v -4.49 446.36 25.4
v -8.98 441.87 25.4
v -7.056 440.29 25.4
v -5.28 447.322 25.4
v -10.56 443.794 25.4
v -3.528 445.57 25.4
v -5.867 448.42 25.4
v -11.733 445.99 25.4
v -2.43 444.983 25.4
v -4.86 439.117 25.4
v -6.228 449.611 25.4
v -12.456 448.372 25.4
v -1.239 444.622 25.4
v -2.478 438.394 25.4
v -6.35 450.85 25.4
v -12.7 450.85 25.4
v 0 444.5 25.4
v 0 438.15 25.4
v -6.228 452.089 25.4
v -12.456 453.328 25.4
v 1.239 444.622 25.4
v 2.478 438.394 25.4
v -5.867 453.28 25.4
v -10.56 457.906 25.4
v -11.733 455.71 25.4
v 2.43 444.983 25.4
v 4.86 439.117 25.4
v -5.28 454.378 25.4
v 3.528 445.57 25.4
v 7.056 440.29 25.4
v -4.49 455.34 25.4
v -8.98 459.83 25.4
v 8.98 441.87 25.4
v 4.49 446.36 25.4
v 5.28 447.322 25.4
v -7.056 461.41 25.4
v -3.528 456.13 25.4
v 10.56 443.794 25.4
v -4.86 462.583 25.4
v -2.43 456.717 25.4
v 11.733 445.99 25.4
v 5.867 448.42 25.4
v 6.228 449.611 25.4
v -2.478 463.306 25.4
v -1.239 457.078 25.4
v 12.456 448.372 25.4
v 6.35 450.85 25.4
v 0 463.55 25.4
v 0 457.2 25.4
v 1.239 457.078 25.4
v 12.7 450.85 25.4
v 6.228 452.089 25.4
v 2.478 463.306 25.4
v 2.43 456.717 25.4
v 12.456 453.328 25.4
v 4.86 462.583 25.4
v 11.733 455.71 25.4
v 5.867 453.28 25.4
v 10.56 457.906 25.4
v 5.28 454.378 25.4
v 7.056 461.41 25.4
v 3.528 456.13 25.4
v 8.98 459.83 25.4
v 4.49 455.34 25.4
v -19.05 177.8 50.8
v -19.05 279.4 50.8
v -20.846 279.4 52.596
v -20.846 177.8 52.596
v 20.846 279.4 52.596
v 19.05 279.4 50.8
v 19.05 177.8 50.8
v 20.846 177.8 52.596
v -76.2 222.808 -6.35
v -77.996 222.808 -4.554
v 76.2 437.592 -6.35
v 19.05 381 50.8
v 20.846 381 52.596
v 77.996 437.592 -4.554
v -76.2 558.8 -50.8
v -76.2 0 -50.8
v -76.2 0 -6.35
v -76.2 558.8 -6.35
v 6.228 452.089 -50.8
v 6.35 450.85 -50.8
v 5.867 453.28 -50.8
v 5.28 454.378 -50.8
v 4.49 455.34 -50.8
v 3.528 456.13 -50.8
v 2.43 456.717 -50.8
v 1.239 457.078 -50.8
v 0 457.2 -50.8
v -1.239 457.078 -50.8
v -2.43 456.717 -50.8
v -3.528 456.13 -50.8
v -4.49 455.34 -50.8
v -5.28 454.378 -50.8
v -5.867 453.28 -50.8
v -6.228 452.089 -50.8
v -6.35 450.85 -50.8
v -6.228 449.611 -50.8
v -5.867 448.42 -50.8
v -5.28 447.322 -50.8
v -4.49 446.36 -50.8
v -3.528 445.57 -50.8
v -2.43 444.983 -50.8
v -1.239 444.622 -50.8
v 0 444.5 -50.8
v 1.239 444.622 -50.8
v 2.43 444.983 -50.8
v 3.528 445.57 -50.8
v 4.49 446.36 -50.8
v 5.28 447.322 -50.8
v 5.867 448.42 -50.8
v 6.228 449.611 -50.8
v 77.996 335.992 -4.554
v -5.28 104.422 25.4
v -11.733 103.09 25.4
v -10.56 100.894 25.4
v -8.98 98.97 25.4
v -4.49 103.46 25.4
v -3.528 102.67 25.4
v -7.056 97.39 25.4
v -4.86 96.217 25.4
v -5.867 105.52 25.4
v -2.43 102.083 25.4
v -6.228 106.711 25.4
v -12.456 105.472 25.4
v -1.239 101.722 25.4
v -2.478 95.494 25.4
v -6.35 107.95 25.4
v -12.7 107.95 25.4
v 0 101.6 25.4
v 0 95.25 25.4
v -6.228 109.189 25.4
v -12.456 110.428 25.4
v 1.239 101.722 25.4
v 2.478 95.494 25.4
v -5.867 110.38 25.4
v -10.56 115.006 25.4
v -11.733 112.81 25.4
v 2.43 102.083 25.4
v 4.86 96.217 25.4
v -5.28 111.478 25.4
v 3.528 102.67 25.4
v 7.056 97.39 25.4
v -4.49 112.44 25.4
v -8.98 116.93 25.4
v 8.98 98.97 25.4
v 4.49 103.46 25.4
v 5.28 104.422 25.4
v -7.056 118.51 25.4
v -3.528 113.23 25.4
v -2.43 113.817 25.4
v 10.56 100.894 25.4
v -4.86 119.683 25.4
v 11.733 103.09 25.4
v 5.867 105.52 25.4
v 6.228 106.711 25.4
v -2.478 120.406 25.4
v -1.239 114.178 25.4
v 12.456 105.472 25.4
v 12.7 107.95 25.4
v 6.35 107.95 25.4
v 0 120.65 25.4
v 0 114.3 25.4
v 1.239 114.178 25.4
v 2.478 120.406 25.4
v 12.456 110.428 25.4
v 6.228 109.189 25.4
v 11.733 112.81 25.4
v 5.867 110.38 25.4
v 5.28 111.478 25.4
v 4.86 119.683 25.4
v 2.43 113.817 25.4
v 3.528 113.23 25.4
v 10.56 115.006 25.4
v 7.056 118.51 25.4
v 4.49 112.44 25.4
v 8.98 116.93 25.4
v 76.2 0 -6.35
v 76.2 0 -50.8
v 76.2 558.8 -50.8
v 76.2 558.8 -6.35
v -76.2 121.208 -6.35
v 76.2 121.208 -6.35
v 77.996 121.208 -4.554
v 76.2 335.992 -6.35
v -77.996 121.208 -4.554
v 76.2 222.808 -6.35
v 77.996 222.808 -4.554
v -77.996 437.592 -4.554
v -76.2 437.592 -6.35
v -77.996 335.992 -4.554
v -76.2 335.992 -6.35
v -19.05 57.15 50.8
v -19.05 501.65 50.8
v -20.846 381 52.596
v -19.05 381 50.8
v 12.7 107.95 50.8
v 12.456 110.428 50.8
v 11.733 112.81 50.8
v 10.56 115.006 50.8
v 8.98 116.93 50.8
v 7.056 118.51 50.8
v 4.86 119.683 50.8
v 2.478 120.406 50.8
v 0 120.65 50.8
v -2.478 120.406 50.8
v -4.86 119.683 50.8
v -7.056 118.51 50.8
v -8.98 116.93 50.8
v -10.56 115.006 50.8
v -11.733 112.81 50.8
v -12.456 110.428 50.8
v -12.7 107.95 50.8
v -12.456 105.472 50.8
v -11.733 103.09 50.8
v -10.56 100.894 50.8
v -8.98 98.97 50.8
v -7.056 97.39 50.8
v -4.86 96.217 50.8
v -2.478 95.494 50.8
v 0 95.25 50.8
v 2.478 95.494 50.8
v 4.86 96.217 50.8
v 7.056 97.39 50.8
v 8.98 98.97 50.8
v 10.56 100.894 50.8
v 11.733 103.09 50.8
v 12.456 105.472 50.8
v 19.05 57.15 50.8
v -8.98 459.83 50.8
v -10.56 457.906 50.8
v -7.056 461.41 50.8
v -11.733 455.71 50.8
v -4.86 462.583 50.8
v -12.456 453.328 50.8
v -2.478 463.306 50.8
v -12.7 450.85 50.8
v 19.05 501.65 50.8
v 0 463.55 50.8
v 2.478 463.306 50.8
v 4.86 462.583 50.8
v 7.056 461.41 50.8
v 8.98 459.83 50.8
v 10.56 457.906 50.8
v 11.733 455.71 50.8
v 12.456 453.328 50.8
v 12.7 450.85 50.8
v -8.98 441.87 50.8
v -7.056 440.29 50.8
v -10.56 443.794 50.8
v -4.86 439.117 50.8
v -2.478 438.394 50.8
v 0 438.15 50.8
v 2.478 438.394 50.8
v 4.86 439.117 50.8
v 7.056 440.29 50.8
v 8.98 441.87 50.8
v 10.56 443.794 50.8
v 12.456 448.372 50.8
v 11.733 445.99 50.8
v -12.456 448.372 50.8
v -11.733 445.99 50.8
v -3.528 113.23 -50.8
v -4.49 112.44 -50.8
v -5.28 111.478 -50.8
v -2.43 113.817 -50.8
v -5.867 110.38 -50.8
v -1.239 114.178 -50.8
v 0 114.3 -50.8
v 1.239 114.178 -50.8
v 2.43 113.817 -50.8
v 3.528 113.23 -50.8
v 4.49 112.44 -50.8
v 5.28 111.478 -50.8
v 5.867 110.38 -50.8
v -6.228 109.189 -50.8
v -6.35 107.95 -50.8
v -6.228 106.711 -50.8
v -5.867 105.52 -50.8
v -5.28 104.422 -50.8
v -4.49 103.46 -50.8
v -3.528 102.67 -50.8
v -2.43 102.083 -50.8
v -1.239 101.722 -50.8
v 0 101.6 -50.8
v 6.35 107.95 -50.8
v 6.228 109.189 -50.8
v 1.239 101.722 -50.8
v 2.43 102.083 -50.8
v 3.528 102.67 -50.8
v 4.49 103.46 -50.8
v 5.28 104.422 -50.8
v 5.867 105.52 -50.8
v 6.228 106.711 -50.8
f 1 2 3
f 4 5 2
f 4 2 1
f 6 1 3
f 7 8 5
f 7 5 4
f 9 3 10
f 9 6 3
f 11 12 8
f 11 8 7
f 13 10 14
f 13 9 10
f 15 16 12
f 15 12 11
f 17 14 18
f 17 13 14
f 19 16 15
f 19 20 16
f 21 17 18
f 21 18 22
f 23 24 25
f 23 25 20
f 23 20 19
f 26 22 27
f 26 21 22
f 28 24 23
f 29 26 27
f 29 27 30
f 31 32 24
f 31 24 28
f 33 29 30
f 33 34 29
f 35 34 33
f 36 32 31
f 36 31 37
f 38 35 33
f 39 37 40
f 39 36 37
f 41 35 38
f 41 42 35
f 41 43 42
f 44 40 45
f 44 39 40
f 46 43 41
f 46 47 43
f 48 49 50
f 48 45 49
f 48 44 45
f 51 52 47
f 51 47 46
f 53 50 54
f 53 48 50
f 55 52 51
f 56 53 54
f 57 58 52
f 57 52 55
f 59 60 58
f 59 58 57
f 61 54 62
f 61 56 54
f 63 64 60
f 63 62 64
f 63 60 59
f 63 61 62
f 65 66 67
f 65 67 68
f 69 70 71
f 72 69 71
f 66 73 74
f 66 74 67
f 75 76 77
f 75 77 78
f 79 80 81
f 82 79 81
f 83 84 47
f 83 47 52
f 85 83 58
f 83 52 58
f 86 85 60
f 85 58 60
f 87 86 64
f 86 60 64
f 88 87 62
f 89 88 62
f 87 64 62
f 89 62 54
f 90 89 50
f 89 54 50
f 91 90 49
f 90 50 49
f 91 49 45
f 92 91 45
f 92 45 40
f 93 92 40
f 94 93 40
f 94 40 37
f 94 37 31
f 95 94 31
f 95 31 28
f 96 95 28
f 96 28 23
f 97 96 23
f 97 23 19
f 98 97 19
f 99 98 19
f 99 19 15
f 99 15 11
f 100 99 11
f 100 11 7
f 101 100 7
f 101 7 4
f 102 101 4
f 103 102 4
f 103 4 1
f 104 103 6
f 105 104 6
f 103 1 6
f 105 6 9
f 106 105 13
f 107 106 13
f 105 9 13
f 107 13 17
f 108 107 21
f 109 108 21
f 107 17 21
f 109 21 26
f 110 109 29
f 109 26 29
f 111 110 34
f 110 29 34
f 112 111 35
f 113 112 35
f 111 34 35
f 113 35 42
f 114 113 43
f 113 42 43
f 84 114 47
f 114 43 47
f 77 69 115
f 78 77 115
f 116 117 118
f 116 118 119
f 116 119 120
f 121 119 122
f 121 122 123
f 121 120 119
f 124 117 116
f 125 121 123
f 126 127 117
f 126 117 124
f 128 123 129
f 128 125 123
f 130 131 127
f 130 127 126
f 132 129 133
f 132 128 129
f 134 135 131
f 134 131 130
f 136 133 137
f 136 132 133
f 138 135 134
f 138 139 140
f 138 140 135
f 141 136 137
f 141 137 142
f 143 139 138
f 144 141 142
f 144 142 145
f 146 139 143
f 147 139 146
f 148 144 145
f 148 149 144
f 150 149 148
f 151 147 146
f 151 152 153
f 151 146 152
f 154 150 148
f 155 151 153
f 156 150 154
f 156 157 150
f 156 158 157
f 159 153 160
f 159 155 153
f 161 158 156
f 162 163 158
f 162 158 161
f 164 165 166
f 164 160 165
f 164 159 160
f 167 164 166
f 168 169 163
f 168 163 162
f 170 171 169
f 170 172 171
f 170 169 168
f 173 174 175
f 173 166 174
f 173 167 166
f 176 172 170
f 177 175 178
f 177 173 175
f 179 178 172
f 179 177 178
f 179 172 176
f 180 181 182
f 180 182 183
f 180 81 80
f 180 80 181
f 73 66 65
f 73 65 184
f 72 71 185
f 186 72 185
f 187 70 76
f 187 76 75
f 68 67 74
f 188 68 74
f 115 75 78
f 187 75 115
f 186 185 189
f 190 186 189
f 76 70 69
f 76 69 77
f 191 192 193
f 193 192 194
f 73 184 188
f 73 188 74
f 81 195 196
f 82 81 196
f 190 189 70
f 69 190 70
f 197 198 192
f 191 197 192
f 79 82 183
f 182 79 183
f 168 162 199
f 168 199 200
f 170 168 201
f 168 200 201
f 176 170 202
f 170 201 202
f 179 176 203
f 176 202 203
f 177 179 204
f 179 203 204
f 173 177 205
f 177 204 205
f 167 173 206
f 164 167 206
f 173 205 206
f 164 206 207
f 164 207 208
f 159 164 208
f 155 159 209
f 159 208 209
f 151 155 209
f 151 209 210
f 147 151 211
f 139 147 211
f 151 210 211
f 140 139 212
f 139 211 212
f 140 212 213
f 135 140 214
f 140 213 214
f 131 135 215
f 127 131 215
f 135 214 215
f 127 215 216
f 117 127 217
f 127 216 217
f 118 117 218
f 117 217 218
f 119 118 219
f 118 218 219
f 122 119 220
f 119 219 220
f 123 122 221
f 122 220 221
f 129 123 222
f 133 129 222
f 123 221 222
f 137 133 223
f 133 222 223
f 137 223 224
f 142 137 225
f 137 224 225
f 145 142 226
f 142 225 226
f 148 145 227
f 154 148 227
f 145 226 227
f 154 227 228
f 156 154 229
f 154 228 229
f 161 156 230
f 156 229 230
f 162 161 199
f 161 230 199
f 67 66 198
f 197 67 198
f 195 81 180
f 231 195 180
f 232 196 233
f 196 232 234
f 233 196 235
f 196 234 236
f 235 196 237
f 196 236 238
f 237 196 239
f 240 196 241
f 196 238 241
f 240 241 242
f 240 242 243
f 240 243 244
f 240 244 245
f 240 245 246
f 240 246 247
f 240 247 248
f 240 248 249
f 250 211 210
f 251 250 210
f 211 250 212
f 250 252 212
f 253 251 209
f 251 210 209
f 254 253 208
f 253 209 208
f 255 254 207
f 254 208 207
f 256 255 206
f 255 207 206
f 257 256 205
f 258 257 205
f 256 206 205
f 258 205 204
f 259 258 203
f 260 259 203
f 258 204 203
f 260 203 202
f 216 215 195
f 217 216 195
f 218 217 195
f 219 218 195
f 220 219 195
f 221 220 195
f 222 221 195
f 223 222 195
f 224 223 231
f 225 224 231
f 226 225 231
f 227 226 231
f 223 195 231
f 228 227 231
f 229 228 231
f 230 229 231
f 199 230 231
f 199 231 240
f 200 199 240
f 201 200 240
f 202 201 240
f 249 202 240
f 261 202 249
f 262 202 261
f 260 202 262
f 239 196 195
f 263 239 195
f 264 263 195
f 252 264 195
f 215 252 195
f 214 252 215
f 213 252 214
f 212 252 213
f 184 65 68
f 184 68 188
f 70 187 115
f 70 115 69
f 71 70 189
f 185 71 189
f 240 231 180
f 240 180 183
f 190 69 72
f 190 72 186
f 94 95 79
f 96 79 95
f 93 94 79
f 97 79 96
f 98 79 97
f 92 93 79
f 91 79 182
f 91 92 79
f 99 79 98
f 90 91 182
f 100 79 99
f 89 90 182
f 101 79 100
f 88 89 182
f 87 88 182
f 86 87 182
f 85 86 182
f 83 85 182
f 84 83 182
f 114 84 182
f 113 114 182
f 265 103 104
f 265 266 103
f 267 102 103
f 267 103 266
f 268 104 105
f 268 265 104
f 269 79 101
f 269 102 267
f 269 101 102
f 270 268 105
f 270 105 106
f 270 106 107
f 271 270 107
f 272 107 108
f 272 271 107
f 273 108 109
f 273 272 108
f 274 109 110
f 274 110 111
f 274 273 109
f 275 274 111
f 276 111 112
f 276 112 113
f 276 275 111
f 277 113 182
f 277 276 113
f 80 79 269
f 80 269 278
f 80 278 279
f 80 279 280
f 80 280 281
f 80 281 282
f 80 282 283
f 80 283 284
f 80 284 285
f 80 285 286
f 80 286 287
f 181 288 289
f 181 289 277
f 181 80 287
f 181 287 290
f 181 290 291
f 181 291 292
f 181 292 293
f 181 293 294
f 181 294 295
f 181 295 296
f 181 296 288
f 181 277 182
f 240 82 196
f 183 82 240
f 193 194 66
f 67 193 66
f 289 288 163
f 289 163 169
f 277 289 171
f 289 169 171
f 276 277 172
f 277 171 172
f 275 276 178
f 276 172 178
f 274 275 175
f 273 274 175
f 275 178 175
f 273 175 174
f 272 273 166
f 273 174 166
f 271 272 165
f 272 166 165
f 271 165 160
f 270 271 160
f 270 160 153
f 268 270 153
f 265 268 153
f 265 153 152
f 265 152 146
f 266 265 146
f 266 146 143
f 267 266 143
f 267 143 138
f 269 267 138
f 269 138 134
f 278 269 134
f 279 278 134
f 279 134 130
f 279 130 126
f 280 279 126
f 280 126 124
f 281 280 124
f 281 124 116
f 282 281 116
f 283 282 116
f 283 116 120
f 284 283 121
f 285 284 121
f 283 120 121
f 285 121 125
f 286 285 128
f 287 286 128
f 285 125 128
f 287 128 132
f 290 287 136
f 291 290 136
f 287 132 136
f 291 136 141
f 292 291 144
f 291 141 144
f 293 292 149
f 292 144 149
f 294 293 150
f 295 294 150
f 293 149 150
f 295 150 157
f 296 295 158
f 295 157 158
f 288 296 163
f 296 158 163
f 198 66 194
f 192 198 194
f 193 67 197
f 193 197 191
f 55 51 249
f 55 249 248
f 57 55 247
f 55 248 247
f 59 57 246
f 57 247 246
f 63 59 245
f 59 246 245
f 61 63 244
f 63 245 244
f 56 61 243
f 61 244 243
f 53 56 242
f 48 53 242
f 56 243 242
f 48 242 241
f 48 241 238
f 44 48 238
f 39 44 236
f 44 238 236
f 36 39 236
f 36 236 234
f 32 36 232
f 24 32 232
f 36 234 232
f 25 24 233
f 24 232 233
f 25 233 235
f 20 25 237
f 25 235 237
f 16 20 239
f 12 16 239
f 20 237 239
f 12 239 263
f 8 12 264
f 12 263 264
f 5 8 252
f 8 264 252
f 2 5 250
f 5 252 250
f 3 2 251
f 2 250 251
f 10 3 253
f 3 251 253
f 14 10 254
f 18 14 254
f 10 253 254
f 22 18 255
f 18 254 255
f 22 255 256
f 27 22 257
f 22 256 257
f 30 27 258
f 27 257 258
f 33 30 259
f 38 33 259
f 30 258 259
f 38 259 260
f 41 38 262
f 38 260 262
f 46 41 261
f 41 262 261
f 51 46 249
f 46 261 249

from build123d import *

# Parameters (mm, degrees)
F0_W      = 152.4
F0_H      = 101.6
F1_DEPTH  = 558.8
F2_SIZE   = 57.15
F5_DEPTH  = 2.54
F8_R      = 12.7
F8_R_2    = 6.35
F9_DEPTH  = 25.4
F10_DEPTH = 101.601


with BuildPart() as f1:
    # F0 (on Front) → F1 (new body)
    with BuildSketch(Plane.XZ):
        Rectangle(F0_W, F0_H)
    extrude(amount=-F1_DEPTH)

    # F2
    f2_edges = [f1.edges().sort_by_distance(p)[0] for p in [
        (76.2, 279.4, 50.8),
        (0, 0, 50.8),
        (-76.2, 279.4, 50.8),
        (0, 558.8, 50.8),
    ]]
    chamfer(f2_edges, length=F2_SIZE)

    # F8 (on face) → F9 (cut)
    with BuildSketch(Plane.XY.offset(50.8)):
        with Locations((0, 107.95)):
            Circle(F8_R)
        with Locations((0, 107.95)):
            Circle(F8_R_2, mode=Mode.SUBTRACT)
        with Locations((0, 450.85)):
            Circle(F8_R)
        with Locations((0, 450.85)):
            Circle(F8_R_2, mode=Mode.SUBTRACT)
    extrude(amount=-F9_DEPTH, mode=Mode.SUBTRACT)

    # F10 (cut, through all): faces of the model
    f10_faces = [f1.faces().sort_by_distance(p)[0] for p in [
        (0, 107.95, 50.8),
        (0, 450.85, 50.8),
    ]]
    extrude(f10_faces, amount=-F10_DEPTH, mode=Mode.SUBTRACT)


with BuildPart() as f5:
    # F4 (on face) → F5 (new body)
    with BuildSketch(Plane(origin=(34.925, 0, 34.925), x_dir=(0.7071067812, 0, -0.7071067812), z_dir=(0.7071067812, 0, 0.7071067812))):
        Polygon((58.3716647869, 222.8076127208), (-22.4506403027, 279.4), (-22.4506403027, 177.8), (58.3716647869, 121.2076127208), align=None)
    extrude(amount=F5_DEPTH)


with BuildPart() as f6_1:
    # F6: instance of F5
    add(f5.part.mirror(Plane.XZ.offset(-279.4)))


with BuildPart() as f7_1:
    # F7: instance of F5
    add(f5.part.mirror(Plane.YZ))


with BuildPart() as f7_2:
    # F7: instance of F6_1
    add(f6_1.part.mirror(Plane.YZ))


solid = Compound([f1.part, f5.part, f6_1.part, f7_1.part, f7_2.part])
